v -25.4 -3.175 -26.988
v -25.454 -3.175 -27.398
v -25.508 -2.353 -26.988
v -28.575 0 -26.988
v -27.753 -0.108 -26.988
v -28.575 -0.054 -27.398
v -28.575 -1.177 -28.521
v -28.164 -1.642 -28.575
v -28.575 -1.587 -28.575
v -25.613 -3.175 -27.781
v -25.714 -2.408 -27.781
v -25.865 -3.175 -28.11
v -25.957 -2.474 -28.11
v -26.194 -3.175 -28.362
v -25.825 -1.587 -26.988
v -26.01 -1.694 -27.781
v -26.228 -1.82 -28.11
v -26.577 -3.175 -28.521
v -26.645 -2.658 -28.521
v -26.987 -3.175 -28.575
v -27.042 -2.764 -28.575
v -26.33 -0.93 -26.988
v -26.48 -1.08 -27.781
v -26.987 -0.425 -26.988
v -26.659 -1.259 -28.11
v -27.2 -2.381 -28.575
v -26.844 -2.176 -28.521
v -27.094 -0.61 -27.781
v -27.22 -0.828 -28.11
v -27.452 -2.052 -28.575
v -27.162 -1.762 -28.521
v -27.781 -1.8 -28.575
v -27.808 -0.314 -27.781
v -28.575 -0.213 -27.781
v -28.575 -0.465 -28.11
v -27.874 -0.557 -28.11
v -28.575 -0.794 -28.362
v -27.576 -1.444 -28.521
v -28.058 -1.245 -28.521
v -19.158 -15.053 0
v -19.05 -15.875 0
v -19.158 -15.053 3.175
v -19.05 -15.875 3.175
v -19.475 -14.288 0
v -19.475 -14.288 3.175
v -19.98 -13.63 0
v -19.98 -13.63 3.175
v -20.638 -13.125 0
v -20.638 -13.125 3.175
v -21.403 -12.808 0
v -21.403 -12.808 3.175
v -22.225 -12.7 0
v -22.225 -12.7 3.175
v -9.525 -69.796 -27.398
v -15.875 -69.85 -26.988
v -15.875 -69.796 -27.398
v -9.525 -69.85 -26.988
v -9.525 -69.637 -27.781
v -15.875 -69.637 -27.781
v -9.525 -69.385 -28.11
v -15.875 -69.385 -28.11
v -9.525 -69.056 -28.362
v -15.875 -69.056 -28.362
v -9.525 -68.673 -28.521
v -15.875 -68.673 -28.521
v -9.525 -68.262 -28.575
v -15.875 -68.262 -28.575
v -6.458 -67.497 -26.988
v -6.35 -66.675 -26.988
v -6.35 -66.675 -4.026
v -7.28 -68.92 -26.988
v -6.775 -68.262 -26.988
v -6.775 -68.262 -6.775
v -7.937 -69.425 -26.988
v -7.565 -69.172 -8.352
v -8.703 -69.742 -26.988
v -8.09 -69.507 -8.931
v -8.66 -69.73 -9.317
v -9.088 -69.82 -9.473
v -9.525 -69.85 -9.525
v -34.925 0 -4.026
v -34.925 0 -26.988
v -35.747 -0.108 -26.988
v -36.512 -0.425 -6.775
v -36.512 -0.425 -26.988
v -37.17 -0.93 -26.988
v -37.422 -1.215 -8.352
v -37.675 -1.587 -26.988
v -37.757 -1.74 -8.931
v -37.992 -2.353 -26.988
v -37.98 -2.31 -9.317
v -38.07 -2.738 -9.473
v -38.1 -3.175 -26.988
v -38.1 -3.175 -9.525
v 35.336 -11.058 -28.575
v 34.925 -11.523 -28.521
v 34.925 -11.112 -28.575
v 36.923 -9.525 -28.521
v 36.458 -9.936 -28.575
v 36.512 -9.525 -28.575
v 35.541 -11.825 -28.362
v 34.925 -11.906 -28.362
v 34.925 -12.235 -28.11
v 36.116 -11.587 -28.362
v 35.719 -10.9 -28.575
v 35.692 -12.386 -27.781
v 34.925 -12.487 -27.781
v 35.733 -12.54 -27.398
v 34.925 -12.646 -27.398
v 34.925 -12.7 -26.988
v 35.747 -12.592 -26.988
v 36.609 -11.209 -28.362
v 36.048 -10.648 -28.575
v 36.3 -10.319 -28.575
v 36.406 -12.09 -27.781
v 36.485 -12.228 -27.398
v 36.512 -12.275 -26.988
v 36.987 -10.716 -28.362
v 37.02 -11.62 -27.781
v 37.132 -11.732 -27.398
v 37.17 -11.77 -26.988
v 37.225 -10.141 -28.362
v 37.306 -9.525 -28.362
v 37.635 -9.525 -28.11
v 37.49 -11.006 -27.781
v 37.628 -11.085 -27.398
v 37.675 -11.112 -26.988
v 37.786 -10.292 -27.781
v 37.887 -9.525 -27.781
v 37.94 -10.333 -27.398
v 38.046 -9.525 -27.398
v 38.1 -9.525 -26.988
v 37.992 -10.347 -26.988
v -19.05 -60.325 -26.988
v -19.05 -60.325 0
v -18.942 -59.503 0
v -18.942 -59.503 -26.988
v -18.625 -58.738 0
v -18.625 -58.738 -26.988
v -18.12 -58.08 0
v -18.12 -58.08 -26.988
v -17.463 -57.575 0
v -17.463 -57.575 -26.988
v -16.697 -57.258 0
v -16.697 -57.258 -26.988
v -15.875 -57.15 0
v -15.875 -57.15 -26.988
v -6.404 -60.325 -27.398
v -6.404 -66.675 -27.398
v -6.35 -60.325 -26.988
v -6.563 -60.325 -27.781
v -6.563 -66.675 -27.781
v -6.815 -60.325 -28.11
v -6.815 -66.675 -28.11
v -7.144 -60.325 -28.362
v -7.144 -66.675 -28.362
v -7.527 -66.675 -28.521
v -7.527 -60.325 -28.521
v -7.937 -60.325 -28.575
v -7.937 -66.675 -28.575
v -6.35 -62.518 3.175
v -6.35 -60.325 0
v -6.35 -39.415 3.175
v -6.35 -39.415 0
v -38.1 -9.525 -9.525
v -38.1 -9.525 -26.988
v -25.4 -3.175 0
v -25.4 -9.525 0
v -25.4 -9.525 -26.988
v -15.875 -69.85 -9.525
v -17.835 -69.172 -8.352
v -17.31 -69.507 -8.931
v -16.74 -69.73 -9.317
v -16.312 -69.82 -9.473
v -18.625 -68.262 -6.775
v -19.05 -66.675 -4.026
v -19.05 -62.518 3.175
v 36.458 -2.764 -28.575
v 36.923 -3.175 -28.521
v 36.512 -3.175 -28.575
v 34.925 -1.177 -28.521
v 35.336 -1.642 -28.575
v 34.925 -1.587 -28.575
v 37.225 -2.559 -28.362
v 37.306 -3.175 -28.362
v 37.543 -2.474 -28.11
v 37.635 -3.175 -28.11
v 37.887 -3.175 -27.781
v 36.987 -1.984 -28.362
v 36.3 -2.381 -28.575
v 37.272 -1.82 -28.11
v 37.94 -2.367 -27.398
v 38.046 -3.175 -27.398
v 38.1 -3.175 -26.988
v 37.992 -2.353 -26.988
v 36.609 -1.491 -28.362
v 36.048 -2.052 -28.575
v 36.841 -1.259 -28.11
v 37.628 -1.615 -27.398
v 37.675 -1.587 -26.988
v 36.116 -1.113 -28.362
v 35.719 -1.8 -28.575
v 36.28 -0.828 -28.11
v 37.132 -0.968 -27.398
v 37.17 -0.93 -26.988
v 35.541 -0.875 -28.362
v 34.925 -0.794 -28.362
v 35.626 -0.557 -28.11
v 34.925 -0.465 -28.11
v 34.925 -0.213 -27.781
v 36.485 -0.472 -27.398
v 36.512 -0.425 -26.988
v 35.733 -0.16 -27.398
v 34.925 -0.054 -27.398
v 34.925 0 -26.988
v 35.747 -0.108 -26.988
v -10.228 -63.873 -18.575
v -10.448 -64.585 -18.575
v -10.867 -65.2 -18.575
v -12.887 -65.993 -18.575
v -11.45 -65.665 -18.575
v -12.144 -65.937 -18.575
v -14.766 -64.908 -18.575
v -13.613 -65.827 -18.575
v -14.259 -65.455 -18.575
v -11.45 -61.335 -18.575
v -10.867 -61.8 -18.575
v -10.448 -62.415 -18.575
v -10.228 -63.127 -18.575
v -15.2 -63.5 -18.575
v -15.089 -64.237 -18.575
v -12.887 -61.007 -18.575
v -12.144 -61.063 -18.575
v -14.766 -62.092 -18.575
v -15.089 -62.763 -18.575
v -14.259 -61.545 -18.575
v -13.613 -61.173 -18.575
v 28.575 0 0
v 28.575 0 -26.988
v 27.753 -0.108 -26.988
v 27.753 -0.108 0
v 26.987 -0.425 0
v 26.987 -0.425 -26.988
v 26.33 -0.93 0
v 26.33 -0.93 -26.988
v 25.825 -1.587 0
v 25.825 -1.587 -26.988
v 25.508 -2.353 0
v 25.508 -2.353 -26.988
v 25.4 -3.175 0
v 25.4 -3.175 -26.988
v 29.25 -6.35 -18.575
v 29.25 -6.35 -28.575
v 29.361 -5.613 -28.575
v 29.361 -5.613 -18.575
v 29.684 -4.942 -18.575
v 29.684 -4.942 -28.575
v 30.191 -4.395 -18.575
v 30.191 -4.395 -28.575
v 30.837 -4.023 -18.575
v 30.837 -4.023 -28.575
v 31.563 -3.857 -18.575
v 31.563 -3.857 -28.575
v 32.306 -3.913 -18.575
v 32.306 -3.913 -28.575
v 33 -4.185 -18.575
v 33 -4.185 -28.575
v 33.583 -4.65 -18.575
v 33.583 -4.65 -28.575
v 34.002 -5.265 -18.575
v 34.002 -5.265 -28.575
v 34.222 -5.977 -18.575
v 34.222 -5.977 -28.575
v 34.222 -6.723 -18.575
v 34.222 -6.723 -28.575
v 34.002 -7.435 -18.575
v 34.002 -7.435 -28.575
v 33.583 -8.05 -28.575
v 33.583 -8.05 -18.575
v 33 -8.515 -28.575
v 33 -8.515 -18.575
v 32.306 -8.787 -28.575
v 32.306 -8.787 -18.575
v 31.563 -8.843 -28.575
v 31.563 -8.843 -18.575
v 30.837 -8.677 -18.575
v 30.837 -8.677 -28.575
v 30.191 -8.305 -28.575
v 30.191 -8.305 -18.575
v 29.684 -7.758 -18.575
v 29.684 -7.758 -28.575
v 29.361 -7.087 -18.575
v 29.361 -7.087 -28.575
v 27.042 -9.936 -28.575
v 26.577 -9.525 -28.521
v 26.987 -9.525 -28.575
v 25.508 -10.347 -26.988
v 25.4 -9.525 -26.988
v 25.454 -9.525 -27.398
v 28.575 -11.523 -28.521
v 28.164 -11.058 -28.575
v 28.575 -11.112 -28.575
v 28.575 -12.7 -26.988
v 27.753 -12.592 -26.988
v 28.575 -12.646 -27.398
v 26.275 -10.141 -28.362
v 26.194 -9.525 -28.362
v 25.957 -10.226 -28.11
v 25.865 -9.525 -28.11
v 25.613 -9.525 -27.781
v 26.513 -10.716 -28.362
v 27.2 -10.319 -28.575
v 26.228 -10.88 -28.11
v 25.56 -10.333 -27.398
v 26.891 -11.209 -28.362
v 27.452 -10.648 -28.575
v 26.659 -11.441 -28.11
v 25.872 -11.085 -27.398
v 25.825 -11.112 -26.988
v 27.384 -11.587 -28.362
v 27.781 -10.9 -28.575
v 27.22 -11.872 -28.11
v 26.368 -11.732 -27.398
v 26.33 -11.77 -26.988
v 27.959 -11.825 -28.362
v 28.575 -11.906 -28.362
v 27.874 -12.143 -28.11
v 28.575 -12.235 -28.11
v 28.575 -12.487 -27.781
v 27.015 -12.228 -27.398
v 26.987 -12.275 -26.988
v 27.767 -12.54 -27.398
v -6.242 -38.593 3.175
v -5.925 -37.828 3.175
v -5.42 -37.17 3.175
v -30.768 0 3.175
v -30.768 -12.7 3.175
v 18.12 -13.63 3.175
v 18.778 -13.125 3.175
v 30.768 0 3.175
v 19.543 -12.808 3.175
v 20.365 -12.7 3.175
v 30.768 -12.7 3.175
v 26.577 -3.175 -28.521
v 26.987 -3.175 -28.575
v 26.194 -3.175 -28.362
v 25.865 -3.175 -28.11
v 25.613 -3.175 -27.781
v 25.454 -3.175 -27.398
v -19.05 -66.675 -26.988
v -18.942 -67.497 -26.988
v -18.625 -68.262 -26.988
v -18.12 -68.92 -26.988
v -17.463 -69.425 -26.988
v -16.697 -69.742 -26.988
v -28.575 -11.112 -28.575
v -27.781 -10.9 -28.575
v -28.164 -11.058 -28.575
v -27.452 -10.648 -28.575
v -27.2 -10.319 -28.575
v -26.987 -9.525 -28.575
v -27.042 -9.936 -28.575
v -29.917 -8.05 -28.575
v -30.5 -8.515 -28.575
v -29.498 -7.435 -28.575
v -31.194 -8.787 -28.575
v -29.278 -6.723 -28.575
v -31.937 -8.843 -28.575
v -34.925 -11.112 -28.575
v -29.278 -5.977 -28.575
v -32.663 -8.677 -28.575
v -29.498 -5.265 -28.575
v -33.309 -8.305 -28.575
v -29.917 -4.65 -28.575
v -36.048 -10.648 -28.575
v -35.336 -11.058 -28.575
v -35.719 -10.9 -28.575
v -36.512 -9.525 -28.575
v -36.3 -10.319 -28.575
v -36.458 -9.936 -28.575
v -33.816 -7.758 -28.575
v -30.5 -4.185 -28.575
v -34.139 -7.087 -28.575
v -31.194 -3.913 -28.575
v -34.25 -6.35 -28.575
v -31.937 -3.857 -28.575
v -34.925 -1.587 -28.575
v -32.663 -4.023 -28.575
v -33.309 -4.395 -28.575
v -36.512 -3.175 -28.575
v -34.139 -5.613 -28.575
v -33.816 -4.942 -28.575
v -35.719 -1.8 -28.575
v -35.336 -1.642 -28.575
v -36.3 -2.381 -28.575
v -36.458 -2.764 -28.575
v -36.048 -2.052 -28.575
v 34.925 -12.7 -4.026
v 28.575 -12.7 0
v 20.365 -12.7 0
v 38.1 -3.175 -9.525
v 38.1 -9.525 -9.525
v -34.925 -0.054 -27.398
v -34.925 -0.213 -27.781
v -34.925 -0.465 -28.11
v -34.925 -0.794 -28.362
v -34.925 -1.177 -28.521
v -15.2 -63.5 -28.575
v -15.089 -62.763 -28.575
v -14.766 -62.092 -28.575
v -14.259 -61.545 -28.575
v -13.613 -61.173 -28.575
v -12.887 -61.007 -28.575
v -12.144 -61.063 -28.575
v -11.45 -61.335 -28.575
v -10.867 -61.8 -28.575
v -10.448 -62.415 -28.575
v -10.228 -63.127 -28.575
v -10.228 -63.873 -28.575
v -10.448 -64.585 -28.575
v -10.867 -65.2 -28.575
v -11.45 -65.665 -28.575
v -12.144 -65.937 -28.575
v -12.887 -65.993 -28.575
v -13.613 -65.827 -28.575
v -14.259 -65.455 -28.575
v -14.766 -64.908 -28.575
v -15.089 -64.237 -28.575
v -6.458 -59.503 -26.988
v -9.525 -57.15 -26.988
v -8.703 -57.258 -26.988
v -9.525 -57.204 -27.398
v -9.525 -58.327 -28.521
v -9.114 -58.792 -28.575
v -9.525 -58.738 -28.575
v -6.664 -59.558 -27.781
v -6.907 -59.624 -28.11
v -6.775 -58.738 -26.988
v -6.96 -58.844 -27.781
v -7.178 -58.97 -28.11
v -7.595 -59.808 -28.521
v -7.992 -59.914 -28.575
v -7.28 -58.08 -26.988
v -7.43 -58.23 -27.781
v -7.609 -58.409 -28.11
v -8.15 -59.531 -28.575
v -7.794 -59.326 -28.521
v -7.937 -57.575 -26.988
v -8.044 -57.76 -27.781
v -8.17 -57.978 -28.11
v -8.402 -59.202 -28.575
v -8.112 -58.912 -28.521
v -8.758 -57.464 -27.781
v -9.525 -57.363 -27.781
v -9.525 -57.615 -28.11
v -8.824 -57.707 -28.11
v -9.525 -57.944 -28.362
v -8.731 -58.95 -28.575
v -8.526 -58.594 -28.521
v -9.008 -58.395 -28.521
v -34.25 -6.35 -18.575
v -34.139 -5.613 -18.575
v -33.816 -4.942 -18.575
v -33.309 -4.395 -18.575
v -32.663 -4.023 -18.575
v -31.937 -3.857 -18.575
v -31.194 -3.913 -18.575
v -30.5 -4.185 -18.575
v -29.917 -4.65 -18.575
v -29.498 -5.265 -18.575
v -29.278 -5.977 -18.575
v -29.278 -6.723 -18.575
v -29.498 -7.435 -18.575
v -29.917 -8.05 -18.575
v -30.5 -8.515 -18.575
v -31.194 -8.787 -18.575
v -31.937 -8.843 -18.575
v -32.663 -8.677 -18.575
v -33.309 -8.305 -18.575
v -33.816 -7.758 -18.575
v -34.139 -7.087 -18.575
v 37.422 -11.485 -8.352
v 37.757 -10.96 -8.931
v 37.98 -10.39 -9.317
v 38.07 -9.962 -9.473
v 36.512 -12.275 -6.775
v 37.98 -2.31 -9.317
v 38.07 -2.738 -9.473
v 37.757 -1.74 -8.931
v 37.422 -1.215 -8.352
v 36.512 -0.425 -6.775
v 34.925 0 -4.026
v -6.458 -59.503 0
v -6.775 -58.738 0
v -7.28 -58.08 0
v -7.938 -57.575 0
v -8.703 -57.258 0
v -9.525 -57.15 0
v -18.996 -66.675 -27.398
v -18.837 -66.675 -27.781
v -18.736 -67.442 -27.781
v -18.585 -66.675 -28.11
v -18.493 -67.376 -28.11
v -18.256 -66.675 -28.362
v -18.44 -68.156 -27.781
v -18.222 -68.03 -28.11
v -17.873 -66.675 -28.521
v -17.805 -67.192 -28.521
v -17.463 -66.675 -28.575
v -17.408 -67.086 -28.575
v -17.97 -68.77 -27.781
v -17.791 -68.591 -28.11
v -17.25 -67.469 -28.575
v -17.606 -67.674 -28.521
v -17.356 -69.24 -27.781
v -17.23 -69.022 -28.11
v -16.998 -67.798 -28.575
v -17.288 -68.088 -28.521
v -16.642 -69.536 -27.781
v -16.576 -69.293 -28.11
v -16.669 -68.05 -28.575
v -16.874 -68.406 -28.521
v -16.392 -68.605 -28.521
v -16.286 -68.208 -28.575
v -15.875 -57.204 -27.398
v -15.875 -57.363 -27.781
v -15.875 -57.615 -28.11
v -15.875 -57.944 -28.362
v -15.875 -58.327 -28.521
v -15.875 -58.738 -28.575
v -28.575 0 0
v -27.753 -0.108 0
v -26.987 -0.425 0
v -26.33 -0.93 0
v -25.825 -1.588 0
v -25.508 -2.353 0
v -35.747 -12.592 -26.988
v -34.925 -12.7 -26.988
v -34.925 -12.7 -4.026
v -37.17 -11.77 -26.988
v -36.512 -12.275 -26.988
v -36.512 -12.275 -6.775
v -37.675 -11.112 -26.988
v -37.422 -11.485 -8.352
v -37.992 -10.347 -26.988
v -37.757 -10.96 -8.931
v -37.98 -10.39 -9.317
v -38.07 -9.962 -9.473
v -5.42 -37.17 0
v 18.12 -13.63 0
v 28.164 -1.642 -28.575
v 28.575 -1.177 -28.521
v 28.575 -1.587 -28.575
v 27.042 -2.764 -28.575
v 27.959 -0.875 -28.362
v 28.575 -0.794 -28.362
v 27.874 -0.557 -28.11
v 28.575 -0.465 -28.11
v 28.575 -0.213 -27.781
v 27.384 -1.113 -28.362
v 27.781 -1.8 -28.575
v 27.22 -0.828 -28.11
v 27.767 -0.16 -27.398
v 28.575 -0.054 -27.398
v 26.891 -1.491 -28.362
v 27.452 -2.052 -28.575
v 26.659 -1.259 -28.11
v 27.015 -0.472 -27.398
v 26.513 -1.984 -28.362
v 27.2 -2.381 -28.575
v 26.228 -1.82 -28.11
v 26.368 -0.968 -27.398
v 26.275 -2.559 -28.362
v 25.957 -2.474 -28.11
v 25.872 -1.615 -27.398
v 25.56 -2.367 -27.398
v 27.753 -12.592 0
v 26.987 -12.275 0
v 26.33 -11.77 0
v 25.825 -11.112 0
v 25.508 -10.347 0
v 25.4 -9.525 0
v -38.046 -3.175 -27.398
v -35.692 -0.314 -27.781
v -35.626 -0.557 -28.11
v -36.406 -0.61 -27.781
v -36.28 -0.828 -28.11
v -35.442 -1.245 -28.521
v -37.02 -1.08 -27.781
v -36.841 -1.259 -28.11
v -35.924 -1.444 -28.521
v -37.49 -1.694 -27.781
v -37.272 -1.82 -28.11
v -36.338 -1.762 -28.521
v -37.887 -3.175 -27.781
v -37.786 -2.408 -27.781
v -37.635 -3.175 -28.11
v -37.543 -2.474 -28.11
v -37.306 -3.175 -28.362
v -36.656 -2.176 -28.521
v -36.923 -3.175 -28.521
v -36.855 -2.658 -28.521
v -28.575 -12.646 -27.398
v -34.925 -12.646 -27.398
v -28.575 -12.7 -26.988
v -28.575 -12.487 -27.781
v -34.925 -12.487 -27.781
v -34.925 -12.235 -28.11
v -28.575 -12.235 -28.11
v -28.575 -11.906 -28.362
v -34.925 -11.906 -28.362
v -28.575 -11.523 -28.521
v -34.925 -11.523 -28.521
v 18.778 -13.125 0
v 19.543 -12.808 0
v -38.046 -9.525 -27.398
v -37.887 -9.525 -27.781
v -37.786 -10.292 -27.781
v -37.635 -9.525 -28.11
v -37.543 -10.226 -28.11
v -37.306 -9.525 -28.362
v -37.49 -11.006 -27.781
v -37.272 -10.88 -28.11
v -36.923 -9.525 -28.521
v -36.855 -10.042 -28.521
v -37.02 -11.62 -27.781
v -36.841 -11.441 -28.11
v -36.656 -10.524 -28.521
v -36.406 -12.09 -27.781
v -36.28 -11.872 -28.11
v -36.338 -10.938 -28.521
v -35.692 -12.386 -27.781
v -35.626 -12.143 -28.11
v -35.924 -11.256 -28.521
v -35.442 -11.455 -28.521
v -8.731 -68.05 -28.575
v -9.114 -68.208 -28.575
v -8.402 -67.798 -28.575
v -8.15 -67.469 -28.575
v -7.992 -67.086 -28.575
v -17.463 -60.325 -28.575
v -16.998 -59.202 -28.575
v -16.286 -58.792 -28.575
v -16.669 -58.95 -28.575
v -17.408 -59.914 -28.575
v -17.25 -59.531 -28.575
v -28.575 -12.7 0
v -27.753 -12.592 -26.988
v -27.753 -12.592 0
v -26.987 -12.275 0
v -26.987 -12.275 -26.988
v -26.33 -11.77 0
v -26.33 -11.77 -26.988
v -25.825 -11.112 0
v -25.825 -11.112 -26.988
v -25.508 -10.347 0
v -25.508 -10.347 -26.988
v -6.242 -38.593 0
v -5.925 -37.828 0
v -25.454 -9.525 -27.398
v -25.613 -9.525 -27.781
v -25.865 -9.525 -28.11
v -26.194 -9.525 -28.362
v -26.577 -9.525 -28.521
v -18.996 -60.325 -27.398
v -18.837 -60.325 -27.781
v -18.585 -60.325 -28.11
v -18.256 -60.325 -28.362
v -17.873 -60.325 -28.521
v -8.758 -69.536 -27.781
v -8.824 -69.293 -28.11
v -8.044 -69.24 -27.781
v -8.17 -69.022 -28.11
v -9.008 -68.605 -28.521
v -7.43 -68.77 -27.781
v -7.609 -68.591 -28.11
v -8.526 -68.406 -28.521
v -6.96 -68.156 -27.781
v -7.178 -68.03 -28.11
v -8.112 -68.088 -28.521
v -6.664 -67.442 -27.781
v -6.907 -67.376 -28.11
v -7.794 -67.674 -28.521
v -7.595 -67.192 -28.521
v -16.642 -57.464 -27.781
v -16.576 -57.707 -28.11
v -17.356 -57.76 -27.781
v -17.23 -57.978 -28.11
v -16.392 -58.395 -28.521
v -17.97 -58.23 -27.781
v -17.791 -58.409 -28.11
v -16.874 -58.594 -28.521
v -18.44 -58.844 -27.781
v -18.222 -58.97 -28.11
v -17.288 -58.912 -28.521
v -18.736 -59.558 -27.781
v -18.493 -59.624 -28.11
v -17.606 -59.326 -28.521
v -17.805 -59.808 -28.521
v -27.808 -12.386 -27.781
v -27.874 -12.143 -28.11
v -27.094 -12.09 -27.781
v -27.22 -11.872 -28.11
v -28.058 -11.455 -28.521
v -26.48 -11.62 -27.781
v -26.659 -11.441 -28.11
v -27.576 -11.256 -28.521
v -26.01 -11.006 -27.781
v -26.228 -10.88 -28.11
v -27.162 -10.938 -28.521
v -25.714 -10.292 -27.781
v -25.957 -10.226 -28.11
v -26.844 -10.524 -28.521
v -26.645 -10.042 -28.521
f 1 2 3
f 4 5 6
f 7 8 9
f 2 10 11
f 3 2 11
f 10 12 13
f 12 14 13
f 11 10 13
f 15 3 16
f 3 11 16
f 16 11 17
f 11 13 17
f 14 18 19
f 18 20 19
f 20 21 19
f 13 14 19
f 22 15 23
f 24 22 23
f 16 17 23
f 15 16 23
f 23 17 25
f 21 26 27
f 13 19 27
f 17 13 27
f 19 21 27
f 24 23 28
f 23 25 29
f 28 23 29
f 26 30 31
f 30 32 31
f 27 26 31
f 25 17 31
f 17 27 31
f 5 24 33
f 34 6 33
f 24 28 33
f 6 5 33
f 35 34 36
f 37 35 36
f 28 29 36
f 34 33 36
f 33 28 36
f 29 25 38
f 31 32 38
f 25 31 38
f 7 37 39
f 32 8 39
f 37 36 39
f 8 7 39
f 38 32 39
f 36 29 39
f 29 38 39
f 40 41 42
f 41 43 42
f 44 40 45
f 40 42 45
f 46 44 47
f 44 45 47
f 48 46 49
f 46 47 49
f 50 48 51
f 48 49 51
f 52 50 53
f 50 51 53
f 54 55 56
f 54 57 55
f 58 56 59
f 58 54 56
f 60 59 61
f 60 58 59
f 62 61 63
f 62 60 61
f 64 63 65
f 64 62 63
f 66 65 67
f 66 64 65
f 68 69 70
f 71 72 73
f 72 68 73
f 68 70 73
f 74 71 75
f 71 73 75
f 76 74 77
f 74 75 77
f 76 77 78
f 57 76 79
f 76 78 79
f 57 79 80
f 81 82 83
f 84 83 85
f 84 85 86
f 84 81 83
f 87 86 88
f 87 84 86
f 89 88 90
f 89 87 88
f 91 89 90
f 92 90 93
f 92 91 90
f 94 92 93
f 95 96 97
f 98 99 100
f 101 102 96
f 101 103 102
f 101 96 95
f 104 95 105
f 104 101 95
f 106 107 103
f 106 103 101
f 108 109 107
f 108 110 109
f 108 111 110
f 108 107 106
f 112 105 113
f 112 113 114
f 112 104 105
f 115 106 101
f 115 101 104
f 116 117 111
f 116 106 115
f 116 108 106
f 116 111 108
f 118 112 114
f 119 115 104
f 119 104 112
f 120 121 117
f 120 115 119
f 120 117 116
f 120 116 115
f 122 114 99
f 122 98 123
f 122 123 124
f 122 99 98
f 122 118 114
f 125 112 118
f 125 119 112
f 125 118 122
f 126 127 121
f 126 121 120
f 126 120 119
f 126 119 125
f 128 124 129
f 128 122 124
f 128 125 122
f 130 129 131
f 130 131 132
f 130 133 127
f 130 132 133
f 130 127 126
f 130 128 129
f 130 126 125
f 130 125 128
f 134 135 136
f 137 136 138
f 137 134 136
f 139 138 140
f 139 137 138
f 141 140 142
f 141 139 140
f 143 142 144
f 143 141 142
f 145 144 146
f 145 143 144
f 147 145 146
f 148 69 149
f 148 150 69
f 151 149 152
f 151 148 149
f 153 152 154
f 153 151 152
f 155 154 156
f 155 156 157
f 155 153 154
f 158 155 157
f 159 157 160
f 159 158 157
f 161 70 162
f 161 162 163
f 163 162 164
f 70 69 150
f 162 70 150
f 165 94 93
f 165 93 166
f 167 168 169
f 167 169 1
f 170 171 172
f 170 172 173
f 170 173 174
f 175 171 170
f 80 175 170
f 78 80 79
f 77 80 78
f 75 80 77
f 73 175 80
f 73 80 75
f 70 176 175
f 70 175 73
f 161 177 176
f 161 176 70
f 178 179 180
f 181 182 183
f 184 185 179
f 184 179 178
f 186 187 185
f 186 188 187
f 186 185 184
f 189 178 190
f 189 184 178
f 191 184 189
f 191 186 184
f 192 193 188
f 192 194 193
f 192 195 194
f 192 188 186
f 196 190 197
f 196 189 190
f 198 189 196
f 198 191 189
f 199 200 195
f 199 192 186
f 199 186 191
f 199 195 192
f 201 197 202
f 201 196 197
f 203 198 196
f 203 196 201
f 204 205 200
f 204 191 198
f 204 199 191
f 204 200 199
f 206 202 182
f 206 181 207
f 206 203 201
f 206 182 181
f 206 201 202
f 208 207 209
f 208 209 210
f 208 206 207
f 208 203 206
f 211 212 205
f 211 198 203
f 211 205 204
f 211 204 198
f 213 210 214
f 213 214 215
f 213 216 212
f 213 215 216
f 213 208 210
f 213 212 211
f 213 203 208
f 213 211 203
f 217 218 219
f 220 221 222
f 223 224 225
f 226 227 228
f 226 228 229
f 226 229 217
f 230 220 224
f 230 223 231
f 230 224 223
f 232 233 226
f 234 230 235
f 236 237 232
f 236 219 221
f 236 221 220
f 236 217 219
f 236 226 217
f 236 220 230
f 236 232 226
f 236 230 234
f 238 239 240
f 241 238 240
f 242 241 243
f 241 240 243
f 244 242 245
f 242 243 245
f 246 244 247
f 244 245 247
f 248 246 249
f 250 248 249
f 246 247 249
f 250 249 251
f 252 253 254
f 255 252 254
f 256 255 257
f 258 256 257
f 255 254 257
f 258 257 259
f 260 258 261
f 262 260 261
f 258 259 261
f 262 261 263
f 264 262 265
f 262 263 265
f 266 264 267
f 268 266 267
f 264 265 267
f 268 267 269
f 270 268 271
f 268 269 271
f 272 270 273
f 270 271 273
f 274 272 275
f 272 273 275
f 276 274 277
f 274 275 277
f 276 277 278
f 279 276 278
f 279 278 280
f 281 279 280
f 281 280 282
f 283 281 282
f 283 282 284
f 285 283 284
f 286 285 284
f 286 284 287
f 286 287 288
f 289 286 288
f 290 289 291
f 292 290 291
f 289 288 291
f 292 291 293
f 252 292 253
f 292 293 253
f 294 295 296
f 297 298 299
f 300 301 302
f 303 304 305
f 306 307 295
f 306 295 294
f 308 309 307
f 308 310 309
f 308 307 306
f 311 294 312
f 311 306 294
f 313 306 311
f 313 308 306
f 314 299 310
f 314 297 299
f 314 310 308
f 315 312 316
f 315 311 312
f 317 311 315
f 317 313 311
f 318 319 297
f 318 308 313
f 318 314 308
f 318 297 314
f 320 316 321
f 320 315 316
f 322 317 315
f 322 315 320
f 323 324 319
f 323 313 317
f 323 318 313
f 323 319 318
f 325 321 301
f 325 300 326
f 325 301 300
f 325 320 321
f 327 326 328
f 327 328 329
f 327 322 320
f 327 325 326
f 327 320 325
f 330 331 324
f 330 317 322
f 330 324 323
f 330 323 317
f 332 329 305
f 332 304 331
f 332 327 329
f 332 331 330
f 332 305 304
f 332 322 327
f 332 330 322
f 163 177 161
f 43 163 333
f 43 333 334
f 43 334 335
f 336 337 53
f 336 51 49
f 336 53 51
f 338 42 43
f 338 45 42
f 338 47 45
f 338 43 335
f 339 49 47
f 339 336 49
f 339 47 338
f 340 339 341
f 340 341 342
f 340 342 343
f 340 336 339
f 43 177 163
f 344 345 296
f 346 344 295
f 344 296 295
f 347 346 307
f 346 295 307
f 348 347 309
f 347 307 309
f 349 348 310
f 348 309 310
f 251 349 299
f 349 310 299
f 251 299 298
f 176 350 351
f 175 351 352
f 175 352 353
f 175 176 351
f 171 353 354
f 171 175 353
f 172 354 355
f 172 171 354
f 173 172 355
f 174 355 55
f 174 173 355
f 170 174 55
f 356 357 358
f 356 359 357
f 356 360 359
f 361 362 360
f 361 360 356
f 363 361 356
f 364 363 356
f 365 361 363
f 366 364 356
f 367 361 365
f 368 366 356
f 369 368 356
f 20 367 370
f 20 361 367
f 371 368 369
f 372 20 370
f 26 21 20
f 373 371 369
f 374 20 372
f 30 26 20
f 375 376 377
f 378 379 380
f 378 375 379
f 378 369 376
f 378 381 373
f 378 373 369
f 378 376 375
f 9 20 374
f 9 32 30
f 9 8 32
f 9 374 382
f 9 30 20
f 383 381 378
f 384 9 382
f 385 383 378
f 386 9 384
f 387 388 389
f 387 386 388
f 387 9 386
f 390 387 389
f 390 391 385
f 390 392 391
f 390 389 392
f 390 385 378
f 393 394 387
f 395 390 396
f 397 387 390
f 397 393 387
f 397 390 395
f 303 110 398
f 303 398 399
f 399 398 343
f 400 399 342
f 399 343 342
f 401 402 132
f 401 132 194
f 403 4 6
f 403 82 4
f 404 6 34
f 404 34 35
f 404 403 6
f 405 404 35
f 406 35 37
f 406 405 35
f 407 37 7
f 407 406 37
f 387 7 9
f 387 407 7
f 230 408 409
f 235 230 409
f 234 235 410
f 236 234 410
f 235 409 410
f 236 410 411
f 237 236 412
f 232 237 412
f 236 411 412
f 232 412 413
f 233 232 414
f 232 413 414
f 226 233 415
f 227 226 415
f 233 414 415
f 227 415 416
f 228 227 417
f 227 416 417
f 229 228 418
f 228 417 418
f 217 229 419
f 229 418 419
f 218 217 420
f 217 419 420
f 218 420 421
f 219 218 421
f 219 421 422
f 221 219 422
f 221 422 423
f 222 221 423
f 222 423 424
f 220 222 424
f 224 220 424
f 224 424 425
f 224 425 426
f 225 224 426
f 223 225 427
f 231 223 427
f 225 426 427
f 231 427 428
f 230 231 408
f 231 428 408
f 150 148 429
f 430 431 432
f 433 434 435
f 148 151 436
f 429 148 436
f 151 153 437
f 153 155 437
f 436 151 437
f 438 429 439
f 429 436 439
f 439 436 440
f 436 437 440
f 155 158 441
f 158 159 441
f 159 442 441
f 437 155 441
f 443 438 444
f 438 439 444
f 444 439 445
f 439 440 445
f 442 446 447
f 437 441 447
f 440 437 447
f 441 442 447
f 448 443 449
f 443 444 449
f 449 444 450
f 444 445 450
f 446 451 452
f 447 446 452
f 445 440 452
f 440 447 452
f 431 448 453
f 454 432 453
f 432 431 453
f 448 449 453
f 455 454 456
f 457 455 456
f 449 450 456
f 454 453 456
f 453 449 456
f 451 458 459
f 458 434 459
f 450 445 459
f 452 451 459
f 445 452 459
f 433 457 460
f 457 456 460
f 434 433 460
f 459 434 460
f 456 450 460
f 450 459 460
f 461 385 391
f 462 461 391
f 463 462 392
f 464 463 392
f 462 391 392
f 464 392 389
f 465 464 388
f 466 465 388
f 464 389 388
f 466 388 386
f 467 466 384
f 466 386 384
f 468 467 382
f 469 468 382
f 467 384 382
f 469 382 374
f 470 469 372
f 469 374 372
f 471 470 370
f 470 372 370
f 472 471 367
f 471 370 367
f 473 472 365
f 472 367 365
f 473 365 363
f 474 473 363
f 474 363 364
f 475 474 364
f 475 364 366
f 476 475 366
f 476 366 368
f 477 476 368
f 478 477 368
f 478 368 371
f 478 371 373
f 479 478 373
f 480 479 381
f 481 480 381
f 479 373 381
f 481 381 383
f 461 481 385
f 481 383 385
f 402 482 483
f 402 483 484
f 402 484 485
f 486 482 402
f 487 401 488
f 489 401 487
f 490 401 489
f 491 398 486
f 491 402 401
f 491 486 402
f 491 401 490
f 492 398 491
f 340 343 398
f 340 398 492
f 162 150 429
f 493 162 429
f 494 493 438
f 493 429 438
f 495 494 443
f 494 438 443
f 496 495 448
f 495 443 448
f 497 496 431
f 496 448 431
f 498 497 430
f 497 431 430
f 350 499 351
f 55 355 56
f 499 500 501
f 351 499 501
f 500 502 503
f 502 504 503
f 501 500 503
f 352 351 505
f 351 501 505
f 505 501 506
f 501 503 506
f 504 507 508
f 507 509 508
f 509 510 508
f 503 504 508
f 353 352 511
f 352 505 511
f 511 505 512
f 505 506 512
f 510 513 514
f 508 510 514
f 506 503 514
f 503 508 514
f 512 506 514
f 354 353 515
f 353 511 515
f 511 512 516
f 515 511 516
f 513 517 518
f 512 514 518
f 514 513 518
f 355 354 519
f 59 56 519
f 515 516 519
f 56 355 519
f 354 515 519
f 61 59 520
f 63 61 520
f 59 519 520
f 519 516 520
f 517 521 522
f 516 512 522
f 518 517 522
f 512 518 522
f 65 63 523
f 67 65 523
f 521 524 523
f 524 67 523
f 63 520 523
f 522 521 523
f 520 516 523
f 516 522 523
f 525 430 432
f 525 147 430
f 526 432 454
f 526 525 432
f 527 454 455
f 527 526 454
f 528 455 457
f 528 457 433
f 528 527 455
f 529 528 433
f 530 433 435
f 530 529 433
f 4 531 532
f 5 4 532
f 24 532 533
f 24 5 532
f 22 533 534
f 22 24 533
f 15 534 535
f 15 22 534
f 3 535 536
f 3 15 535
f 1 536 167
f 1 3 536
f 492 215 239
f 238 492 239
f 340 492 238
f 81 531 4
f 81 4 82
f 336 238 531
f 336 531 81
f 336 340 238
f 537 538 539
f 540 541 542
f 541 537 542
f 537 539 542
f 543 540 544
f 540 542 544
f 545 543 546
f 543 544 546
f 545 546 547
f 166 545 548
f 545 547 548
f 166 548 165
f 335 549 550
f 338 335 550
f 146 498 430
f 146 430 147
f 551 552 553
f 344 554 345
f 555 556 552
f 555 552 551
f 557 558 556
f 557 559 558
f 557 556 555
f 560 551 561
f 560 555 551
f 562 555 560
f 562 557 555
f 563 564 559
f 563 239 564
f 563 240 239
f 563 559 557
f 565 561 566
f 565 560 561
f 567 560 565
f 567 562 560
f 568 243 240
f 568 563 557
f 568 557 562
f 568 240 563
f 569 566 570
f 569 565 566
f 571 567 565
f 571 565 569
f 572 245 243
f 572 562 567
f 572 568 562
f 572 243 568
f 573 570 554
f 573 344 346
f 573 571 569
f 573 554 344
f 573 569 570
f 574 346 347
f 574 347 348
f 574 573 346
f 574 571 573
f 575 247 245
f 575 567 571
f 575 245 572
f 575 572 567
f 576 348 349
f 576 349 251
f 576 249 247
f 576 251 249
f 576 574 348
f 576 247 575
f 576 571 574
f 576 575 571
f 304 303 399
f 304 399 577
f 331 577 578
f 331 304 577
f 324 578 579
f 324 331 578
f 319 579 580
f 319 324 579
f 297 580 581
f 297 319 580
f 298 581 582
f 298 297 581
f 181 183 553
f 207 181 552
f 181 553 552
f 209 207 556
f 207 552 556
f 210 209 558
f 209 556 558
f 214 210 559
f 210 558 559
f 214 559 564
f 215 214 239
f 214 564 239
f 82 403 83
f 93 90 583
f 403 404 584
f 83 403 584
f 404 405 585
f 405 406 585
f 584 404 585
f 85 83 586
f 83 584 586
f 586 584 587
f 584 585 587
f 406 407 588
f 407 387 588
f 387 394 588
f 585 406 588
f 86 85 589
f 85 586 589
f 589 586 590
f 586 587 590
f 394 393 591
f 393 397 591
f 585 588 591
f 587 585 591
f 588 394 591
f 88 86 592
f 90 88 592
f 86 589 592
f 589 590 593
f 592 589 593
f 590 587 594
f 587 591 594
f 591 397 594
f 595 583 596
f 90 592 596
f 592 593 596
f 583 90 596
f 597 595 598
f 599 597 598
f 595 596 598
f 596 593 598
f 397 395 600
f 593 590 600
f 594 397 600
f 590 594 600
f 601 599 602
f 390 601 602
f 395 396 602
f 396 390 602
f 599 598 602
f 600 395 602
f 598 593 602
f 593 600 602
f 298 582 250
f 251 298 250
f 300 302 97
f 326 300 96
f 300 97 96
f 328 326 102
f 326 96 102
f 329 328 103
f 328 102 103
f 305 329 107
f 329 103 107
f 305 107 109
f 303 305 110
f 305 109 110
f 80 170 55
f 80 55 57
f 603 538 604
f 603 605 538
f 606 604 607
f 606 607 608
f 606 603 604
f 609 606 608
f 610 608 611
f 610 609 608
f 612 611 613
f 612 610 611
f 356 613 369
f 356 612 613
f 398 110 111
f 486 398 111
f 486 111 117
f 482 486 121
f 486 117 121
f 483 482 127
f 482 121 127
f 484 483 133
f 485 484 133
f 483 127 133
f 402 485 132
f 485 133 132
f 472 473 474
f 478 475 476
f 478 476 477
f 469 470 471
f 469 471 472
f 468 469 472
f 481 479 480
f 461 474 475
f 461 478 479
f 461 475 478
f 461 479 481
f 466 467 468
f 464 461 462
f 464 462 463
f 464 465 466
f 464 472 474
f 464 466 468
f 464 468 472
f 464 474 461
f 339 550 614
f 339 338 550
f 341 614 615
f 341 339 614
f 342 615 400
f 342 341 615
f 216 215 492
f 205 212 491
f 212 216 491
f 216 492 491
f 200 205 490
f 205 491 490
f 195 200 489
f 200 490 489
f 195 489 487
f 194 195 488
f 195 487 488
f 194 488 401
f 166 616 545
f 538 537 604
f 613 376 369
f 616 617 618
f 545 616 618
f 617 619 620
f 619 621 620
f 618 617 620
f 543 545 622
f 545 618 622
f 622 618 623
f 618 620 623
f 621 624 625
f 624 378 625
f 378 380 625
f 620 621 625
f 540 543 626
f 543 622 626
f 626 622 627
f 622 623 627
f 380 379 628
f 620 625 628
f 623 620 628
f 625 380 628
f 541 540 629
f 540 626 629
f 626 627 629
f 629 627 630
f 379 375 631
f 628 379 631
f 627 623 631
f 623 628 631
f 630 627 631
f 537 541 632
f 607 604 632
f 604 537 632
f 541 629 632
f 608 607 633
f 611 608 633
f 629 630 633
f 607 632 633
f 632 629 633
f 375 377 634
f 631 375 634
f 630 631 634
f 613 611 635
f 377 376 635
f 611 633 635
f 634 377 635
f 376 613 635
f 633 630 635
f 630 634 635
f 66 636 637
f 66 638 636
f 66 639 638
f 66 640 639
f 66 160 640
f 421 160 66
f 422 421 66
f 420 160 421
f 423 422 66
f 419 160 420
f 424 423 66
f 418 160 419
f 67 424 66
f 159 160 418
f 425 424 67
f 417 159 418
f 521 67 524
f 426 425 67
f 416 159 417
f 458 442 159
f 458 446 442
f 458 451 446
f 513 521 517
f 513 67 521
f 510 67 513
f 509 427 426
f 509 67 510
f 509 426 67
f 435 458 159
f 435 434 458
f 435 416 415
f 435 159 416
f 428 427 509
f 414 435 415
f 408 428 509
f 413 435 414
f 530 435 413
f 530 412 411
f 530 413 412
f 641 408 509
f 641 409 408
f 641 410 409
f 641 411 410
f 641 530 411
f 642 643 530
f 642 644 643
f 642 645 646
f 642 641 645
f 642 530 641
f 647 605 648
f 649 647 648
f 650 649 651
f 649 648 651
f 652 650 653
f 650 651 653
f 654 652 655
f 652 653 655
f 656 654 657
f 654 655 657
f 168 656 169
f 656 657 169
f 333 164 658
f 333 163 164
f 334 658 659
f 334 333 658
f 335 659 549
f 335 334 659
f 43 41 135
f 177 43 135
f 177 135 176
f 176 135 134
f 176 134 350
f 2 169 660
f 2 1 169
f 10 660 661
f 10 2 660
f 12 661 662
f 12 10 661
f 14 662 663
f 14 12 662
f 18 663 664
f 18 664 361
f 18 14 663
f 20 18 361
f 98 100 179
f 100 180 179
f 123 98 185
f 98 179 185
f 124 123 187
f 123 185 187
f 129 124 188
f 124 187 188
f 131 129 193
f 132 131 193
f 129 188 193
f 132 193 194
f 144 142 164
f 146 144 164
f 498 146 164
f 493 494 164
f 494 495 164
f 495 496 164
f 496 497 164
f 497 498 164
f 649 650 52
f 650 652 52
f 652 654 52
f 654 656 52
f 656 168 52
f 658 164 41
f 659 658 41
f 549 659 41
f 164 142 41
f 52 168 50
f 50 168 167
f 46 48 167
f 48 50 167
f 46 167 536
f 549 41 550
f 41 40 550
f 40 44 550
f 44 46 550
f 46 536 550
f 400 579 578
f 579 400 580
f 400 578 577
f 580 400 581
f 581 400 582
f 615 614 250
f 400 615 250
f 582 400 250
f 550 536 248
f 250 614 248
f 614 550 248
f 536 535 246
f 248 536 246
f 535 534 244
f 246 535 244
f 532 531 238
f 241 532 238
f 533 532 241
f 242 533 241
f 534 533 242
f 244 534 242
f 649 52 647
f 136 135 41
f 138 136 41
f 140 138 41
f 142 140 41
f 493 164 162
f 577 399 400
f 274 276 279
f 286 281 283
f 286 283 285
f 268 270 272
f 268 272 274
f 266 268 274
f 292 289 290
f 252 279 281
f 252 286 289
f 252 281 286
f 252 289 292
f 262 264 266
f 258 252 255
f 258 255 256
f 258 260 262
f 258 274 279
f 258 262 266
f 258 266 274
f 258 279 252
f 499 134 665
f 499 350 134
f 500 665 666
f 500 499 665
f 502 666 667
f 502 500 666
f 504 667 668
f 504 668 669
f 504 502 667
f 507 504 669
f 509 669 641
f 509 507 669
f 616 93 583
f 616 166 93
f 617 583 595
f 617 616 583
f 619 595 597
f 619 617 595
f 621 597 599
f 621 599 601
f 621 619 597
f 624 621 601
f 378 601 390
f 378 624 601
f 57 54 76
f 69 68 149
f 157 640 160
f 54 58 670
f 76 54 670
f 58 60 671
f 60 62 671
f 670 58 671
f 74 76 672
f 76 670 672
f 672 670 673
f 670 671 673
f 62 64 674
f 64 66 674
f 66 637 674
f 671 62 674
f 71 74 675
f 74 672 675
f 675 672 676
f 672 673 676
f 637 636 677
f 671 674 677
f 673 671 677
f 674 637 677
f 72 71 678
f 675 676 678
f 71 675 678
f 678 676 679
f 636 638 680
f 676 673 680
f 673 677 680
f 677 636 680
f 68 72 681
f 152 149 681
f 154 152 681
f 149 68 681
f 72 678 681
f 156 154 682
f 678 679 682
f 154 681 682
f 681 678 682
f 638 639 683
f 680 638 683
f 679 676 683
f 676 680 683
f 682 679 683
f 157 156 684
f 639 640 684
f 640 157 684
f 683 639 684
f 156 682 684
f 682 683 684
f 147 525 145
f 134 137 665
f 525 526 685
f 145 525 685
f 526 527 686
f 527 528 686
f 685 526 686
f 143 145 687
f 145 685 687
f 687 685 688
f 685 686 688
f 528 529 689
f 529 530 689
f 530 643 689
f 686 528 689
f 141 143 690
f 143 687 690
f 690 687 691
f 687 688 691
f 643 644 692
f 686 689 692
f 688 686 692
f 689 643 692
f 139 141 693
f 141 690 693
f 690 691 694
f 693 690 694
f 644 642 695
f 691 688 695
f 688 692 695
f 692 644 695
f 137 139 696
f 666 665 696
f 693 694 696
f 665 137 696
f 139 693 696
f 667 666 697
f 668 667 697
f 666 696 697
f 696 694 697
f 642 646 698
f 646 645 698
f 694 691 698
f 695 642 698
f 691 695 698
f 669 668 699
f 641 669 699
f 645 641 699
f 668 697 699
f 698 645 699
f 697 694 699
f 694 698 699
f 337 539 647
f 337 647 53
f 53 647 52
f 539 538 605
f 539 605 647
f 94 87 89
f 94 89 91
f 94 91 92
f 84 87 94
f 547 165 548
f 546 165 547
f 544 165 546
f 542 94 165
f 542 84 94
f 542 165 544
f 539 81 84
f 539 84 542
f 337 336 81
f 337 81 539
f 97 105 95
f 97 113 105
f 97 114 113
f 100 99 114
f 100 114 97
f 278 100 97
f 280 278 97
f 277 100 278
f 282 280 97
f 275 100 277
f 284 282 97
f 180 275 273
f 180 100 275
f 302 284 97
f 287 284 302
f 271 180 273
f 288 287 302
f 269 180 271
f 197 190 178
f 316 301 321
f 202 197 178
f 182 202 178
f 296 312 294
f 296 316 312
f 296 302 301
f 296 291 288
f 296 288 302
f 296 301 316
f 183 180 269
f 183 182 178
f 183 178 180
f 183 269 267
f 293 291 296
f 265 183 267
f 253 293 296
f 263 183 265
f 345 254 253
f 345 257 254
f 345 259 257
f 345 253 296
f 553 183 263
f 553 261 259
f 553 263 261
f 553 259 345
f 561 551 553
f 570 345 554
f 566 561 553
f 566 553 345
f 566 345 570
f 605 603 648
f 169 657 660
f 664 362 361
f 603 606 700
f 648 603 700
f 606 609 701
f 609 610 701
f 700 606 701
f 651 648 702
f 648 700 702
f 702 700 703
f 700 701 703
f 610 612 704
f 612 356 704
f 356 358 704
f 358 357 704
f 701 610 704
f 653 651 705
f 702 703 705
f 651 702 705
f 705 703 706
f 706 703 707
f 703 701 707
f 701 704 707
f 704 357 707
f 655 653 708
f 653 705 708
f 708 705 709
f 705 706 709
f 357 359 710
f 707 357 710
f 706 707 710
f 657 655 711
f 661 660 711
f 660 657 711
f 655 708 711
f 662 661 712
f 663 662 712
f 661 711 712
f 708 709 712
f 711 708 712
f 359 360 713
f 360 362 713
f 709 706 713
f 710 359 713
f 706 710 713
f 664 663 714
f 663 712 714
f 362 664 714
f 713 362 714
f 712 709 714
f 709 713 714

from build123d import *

# Parameters (mm, degrees)
BOSS_EXTRUDE1_DEPTH   = 3.175
SKETCH2_W             = 12.7
SKETCH2_H             = 12.7
BOSS_EXTRUDE2_DEPTH   = 28.575
SKETCH3_R             = 2.5
CUT_EXTRUDE1_DEPTH    = 10
CHAMFER1_SIZE         = 12.7
CHAMFER1_SIZE2        = 7.332348419
CHAMFER1_PART_2_SIZE  = 12.7
CHAMFER1_PART_2_SIZE2 = 7.332348419
CHAMFER1_PART_3_SIZE  = 12.7
CHAMFER1_PART_3_SIZE2 = 7.332348419
FILLET1_R             = 3.175
FILLET2_R             = 3.175
FILLET4_R             = 1.5875


with BuildPart() as part:
    # Sketch1 → Boss-Extrude1 (new body)
    with BuildSketch(Plane.XY):
        Polygon((38.1, 0), (-38.1, 0), (-38.1, -12.7), (-19.05, -12.7), (-19.05, -69.85), (-6.35, -69.85), (-6.35, -38.1), (19.05, -12.7), (38.1, -12.7), align=None)
    extrude(amount=BOSS_EXTRUDE1_DEPTH)

    # Sketch2 → Boss-Extrude2 (add)
    with BuildSketch(Plane(origin=(0, 0, 0), x_dir=(-1, 0, 0), z_dir=(0, 0, -1))):
        with Locations((-31.75, -6.35)):
            Rectangle(SKETCH2_W, SKETCH2_H)
        with Locations((31.75, -6.35)):
            Rectangle(SKETCH2_W, SKETCH2_H)
        with Locations((12.7, -63.5)):
            Rectangle(SKETCH2_W, SKETCH2_H)
    extrude(amount=BOSS_EXTRUDE2_DEPTH)

    # Sketch3 → Cut-Extrude1 (cut)
    with BuildSketch(Plane(origin=(0, 0, -28.575), x_dir=(-1, 0, 0), z_dir=(0, 0, -1))):
        with Locations((-31.75, -6.35)):
            Circle(SKETCH3_R)
        with Locations((31.75, -6.35)):
            Circle(SKETCH3_R)
        with Locations((12.7, -63.5)):
            Circle(SKETCH3_R)
    extrude(amount=-CUT_EXTRUDE1_DEPTH, mode=Mode.SUBTRACT)

    # Chamfer1
    chamfer1_edges = [part.edges().sort_by_distance(p)[0] for p in [
        (38.1, -6.35, 3.175),
    ]]
    chamfer1_side = [part.faces().sort_by_distance(p)[0] for p in [
        (38.1, -6.35, -12.7),
    ]]
    chamfer(chamfer1_edges, length=CHAMFER1_SIZE, length2=CHAMFER1_SIZE2, reference=chamfer1_side[0])

    # Chamfer1 part 2
    chamfer1_part_2_edges = [part.edges().sort_by_distance(p)[0] for p in [
        (-38.1, -6.35, 3.175),
    ]]
    chamfer1_part_2_side = [part.faces().sort_by_distance(p)[0] for p in [
        (-38.1, -6.35, -12.7),
    ]]
    chamfer(chamfer1_part_2_edges, length=CHAMFER1_PART_2_SIZE, length2=CHAMFER1_PART_2_SIZE2, reference=chamfer1_part_2_side[0])

    # Chamfer1 part 3
    chamfer1_part_3_edges = [part.edges().sort_by_distance(p)[0] for p in [
        (-12.7, -69.85, 3.175),
    ]]
    chamfer1_part_3_side = [part.faces().sort_by_distance(p)[0] for p in [
        (-12.7, -69.85, -12.7),
    ]]
    chamfer(chamfer1_part_3_edges, length=CHAMFER1_PART_3_SIZE, length2=CHAMFER1_PART_3_SIZE2, reference=chamfer1_part_3_side[0])

    # Fillet1
    fillet1_edges = [part.edges().sort_by_distance(p)[0] for p in [
        (-6.35, -38.1, 1.5875),
        (-19.05, -12.7, 1.5875),
        (19.05, -12.7, 1.5875),
    ]]
    fillet(fillet1_edges, radius=FILLET1_R)

    # Fillet2
    fillet2_edges = [part.edges().sort_by_distance(p)[0] for p in [
        (25.4, -12.7, -14.2875),
        (25.4, 0, -14.2875),
        (-25.4, 0, -14.2875),
        (-25.4, -12.7, -14.2875),
        (-19.05, -57.15, -14.2875),
        (-6.35, -57.15, -14.2875),
        (38.1, 0, -19.05),
        (-38.1, 0, -19.05),
        (38.1, -12.7, -19.05),
        (-6.35, -69.85, -19.05),
        (-19.05, -69.85, -19.05),
        (-38.1, -12.7, -19.05),
    ]]
    fillet(fillet2_edges, radius=FILLET2_R)

    # Fillet4
    fillet4_edges = [part.edges().sort_by_distance(p)[0] for p in [
        (-12.7, -57.15, -28.575),
        (-19.05, -63.5, -28.575),
        (-6.35, -63.5, -28.575),
        (-12.7, -69.85, -28.575),
        (-7.27993597, -58.07993597, -28.575),
        (-7.27993597, -68.92006403, -28.575),
        (-18.12006403, -68.92006403, -28.575),
        (-18.12006403, -58.07993597, -28.575),
        (38.1, -6.35, -28.575),
        (31.75, -12.7, -28.575),
        (25.4, -6.35, -28.575),
        (31.75, 0, -28.575),
        (26.32993597, -11.77006403, -28.575),
        (26.32993597, -0.92993597, -28.575),
        (37.17006403, -0.92993597, -28.575),
        (37.17006403, -11.77006403, -28.575),
        (-31.75, 0, -28.575),
        (-25.4, -6.35, -28.575),
        (-38.1, -6.35, -28.575),
        (-31.75, -12.7, -28.575),
        (-37.17006403, -11.77006403, -28.575),
        (-37.17006403, -0.92993597, -28.575),
        (-26.32993597, -11.77006403, -28.575),
        (-26.32993597, -0.92993597, -28.575),
    ]]
    fillet(fillet4_edges, radius=FILLET4_R)


solid = part.part
